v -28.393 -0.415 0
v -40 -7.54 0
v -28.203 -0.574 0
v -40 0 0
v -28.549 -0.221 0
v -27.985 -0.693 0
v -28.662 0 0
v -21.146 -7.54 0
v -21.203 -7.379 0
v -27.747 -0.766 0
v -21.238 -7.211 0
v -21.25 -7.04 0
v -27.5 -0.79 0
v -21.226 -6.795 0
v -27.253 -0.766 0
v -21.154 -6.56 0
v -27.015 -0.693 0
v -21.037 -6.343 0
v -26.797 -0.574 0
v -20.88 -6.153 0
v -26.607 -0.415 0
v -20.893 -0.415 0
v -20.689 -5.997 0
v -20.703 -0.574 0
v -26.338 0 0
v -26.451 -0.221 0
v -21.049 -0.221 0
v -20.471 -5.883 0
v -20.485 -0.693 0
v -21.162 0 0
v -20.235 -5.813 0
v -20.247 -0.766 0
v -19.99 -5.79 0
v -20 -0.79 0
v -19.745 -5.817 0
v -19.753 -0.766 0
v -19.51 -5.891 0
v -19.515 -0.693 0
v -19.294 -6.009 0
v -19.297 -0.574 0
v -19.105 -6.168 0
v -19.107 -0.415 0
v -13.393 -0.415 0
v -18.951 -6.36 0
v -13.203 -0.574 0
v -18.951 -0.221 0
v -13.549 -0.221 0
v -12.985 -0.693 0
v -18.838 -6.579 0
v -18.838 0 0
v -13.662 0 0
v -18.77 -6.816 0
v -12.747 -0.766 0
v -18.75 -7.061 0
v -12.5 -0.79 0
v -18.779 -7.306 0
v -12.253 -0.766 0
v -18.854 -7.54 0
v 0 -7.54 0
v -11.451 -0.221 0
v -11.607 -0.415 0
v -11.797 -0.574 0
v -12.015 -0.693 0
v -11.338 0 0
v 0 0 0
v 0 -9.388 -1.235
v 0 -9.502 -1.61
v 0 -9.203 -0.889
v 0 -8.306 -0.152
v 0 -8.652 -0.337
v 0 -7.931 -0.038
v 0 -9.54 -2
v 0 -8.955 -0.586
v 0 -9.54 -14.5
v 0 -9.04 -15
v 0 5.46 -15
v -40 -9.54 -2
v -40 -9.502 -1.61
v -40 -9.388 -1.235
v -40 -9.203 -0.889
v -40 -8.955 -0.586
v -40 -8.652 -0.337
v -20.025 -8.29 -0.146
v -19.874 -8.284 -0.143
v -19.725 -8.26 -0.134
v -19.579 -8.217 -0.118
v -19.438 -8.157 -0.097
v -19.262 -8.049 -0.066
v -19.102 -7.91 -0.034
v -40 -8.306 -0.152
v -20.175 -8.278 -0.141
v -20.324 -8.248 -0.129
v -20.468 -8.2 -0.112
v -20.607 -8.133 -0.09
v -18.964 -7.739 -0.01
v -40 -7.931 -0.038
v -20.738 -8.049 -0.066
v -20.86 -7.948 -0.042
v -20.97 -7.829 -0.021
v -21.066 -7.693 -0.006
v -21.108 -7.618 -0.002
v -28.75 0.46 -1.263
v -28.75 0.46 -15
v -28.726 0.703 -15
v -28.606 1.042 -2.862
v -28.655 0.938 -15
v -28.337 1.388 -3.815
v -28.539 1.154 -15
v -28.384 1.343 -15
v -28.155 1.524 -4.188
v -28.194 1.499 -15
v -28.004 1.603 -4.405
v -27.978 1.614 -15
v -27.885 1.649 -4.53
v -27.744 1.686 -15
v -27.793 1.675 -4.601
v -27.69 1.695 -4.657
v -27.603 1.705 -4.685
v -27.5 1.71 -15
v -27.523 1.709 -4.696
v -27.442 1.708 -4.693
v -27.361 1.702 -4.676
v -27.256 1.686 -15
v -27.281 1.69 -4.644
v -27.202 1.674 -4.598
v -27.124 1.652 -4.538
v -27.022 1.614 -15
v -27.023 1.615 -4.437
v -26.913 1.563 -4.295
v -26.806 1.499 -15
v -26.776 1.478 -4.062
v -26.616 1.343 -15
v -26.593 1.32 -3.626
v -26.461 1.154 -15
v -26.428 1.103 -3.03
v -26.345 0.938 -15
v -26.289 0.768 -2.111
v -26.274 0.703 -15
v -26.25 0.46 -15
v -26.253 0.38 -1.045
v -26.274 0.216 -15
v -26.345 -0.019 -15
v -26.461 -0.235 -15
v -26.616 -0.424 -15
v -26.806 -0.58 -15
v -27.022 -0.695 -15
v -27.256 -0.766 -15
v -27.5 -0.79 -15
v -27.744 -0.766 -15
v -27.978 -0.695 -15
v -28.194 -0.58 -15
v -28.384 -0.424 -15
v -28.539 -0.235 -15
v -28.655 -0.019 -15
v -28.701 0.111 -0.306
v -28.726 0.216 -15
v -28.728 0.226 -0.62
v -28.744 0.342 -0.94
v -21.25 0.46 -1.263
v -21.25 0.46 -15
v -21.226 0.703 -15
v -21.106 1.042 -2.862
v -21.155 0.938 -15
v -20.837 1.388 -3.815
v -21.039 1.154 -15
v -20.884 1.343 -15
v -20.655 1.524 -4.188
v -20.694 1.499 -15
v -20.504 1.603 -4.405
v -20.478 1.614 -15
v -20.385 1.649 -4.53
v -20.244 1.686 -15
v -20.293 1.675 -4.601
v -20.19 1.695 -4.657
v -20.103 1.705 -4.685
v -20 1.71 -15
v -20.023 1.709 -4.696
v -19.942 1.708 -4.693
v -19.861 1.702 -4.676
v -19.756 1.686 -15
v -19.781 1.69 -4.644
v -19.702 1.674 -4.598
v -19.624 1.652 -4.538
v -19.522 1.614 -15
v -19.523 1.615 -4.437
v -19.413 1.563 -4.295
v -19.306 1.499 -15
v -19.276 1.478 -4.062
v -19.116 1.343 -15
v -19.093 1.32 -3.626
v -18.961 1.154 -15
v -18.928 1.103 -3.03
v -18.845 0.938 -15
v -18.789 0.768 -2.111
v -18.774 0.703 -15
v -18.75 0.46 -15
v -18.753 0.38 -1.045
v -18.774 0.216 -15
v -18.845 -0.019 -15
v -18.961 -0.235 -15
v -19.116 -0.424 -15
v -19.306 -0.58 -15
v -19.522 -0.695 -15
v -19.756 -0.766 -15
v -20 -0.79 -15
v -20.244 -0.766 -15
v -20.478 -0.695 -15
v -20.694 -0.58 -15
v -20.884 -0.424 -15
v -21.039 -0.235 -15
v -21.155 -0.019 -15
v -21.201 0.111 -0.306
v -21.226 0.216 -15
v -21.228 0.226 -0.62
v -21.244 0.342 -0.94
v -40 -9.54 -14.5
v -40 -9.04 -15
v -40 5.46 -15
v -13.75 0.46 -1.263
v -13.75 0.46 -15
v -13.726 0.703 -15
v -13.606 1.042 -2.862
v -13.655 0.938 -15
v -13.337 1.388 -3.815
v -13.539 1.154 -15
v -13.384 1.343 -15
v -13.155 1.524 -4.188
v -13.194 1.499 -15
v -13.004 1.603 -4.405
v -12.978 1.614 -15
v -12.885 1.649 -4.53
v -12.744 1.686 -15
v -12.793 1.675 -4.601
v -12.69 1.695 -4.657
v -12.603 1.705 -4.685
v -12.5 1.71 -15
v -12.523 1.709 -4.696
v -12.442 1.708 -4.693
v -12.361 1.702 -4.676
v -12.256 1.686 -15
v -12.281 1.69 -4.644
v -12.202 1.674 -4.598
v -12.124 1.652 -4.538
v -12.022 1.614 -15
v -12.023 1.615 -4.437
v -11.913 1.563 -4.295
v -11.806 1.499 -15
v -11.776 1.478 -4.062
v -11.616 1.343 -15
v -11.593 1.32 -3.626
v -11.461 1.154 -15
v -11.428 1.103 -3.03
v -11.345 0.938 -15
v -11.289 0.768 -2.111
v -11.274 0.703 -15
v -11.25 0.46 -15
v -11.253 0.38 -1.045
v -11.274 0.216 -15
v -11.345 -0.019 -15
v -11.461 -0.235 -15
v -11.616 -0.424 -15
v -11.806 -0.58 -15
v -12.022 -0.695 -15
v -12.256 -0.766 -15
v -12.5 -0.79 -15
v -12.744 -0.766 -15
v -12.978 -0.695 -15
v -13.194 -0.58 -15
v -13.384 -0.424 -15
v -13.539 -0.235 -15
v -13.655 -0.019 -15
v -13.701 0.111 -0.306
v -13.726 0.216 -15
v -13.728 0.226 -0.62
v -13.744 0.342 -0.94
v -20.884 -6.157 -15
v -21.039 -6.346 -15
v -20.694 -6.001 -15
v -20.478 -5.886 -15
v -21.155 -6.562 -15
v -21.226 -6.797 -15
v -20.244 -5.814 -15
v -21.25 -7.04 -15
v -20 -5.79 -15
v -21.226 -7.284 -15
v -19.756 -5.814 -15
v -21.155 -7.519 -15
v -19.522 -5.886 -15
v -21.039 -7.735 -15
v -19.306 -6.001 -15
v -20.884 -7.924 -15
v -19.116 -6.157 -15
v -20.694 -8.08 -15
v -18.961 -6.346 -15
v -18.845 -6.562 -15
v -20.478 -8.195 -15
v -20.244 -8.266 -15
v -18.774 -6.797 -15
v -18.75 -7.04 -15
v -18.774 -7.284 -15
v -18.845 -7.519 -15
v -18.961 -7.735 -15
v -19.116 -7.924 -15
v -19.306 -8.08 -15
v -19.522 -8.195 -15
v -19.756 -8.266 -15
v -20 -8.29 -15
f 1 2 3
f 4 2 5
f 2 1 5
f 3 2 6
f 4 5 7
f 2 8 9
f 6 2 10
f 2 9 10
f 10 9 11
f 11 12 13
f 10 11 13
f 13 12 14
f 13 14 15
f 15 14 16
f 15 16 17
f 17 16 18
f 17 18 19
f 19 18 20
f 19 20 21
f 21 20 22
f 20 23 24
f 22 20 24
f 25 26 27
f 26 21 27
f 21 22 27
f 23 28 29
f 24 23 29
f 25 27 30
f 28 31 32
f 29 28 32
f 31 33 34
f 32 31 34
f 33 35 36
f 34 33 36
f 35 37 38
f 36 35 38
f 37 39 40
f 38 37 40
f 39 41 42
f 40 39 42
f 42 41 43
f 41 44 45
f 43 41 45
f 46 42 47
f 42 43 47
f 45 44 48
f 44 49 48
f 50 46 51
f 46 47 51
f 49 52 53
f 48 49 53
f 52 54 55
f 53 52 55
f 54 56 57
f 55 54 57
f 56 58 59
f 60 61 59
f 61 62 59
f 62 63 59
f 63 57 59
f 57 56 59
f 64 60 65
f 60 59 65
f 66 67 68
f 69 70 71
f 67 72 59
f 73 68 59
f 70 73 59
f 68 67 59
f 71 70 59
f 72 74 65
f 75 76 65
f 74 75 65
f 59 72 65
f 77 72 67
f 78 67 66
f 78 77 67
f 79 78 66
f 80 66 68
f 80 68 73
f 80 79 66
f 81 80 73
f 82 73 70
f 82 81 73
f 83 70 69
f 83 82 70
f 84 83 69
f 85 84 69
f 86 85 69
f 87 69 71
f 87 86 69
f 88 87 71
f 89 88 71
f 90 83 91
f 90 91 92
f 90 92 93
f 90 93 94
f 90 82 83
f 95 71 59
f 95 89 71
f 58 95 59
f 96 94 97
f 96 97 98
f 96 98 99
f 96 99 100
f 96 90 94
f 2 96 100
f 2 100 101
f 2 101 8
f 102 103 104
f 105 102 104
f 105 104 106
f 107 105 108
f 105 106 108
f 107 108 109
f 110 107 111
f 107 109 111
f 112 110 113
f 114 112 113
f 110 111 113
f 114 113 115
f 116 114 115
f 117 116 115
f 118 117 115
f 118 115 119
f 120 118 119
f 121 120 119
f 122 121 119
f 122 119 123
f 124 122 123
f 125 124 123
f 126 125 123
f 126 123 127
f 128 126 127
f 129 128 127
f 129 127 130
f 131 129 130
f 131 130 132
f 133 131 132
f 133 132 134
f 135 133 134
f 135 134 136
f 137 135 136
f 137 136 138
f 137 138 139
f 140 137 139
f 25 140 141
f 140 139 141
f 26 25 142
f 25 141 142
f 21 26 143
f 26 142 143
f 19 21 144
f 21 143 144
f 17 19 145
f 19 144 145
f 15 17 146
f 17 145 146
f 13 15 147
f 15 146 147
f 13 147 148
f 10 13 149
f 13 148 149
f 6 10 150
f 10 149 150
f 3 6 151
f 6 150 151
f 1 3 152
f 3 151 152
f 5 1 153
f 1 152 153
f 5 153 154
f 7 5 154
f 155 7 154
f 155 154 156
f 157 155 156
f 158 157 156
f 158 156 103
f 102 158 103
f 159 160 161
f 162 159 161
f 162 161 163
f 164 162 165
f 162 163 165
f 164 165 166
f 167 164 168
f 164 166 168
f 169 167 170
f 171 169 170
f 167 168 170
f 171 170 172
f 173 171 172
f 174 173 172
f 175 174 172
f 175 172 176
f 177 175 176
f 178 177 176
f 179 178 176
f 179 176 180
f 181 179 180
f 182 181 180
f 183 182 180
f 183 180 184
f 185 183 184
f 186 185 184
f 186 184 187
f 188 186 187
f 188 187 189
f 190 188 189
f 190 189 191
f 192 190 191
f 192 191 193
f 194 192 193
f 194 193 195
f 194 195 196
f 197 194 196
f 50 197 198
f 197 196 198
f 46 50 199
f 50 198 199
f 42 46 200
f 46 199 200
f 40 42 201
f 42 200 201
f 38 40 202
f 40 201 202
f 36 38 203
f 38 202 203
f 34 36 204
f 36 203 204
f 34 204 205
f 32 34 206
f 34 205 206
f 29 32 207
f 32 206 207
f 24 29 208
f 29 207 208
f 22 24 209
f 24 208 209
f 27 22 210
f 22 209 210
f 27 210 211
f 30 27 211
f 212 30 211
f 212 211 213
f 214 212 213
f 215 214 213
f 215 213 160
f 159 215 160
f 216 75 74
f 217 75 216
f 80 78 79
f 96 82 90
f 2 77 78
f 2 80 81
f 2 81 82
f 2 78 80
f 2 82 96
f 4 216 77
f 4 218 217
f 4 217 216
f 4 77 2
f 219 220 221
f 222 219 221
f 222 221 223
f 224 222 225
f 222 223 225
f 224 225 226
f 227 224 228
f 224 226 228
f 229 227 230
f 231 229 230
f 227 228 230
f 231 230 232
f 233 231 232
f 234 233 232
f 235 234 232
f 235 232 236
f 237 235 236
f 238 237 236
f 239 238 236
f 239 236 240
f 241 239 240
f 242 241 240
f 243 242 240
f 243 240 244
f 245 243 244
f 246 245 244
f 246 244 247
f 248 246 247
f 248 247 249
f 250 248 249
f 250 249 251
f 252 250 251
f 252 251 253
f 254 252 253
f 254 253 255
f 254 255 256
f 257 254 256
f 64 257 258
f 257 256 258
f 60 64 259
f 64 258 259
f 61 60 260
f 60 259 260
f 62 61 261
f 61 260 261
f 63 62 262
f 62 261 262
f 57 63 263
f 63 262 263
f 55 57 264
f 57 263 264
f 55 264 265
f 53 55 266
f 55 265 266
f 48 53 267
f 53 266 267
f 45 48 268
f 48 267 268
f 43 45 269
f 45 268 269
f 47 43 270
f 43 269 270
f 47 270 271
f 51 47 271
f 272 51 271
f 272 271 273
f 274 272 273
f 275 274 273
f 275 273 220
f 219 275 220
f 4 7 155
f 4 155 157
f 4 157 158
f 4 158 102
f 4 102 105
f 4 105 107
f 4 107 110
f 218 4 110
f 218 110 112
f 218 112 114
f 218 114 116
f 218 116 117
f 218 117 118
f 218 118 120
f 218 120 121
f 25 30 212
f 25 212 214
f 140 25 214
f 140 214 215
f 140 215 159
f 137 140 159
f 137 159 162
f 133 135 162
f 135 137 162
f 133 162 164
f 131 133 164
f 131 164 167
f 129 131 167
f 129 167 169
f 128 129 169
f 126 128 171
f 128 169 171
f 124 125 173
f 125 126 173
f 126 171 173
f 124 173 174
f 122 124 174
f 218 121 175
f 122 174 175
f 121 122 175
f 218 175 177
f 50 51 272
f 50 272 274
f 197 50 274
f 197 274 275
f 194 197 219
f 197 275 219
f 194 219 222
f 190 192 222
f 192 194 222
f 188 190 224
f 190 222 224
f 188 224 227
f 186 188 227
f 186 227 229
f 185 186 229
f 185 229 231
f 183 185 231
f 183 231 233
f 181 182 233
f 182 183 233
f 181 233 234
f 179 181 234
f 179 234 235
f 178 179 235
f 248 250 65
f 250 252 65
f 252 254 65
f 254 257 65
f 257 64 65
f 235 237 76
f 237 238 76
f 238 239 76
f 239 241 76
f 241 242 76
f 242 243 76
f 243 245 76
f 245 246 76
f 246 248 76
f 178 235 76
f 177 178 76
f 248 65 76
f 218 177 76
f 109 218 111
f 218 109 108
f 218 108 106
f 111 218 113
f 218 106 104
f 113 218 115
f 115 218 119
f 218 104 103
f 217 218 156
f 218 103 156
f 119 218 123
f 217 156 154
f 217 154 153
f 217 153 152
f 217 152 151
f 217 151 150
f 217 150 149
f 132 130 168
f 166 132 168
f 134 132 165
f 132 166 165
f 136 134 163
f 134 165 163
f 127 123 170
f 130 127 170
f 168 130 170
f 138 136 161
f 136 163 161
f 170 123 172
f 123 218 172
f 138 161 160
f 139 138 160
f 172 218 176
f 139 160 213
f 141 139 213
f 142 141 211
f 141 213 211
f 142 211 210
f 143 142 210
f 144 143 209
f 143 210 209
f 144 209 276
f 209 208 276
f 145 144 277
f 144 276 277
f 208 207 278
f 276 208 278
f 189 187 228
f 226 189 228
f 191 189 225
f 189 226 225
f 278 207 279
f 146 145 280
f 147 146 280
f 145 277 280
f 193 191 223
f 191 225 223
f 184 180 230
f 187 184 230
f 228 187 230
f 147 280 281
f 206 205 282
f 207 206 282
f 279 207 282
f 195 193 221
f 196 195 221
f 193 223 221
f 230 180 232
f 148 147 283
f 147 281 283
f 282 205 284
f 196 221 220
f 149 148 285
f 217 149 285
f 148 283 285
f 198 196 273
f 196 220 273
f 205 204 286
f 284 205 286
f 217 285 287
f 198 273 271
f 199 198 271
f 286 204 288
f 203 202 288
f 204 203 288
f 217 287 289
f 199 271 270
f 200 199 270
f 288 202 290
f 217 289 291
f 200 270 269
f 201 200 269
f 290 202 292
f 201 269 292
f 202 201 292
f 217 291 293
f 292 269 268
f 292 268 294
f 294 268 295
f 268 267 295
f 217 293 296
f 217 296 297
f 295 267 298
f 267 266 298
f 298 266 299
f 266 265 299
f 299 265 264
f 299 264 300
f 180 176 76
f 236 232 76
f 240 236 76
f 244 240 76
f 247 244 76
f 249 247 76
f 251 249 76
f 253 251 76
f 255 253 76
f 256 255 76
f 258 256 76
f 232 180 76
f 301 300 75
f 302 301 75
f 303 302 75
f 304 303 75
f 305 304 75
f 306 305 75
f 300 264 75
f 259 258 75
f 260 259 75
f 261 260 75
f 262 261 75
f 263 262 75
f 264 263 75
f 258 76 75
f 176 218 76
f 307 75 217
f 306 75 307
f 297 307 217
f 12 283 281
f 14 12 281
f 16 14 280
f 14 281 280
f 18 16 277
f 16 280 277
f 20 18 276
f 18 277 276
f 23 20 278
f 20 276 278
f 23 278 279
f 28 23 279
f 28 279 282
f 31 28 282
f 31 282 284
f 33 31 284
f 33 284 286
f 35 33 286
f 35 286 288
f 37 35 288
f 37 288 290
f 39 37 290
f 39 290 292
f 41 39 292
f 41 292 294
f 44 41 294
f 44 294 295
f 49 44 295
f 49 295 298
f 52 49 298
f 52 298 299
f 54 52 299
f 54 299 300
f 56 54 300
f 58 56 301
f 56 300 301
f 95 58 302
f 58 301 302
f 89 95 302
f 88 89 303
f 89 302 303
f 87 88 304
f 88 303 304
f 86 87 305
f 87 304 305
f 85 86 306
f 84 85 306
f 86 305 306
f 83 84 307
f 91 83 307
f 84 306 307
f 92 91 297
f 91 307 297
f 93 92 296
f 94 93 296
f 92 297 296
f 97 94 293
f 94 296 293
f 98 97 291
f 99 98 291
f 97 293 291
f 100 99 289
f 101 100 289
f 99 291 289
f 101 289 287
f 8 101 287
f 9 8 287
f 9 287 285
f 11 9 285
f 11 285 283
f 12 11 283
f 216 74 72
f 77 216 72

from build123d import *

# Parameters (mm, degrees)
EXTRUDE_1_DEPTH     = 40
FILLET_1_R          = 2
CHAMFER_2_SIZE      = 0.5
SKETCH_2_R          = 1.25
CUT_EXTRUDE_1_DEPTH = 44.772367073


with BuildPart() as part:
    # 草图1 → 凸台-拉伸1 (new body)
    with BuildSketch(Plane(origin=(0, 0, 0), x_dir=(0, 0, -1), z_dir=(1, 0, 0))):
        Polygon((0, 0), (15, 5.459553514), (15, -9.540446486), (0, -9.540446486), align=None)
    extrude(amount=-EXTRUDE_1_DEPTH)

    # 圆角1
    fillet_1_edges = [part.edges().sort_by_distance(p)[0] for p in [
        (-20, -9.540446486, 0),
    ]]
    fillet(fillet_1_edges, radius=FILLET_1_R)

    # 倒角2
    chamfer_2_edges = [part.edges().sort_by_distance(p)[0] for p in [
        (-20, -9.540446486, -15),
    ]]
    chamfer(chamfer_2_edges, length=CHAMFER_2_SIZE)

    # 草图2 → 切除-拉伸1 (cut, through all)
    with BuildSketch(Plane(origin=(0, 0, -15), x_dir=(-1, 0, 0), z_dir=(0, 0, -1))):
        with Locations((20, 0.459553514)):
            Circle(SKETCH_2_R)
        with Locations((27.5, 0.459553514)):
            Circle(SKETCH_2_R)
        with Locations((12.5, 0.459553514)):
            Circle(SKETCH_2_R)
        with Locations((20, -7.040446486)):
            Circle(SKETCH_2_R)
    extrude(amount=-CUT_EXTRUDE_1_DEPTH, mode=Mode.SUBTRACT)


solid = part.part
